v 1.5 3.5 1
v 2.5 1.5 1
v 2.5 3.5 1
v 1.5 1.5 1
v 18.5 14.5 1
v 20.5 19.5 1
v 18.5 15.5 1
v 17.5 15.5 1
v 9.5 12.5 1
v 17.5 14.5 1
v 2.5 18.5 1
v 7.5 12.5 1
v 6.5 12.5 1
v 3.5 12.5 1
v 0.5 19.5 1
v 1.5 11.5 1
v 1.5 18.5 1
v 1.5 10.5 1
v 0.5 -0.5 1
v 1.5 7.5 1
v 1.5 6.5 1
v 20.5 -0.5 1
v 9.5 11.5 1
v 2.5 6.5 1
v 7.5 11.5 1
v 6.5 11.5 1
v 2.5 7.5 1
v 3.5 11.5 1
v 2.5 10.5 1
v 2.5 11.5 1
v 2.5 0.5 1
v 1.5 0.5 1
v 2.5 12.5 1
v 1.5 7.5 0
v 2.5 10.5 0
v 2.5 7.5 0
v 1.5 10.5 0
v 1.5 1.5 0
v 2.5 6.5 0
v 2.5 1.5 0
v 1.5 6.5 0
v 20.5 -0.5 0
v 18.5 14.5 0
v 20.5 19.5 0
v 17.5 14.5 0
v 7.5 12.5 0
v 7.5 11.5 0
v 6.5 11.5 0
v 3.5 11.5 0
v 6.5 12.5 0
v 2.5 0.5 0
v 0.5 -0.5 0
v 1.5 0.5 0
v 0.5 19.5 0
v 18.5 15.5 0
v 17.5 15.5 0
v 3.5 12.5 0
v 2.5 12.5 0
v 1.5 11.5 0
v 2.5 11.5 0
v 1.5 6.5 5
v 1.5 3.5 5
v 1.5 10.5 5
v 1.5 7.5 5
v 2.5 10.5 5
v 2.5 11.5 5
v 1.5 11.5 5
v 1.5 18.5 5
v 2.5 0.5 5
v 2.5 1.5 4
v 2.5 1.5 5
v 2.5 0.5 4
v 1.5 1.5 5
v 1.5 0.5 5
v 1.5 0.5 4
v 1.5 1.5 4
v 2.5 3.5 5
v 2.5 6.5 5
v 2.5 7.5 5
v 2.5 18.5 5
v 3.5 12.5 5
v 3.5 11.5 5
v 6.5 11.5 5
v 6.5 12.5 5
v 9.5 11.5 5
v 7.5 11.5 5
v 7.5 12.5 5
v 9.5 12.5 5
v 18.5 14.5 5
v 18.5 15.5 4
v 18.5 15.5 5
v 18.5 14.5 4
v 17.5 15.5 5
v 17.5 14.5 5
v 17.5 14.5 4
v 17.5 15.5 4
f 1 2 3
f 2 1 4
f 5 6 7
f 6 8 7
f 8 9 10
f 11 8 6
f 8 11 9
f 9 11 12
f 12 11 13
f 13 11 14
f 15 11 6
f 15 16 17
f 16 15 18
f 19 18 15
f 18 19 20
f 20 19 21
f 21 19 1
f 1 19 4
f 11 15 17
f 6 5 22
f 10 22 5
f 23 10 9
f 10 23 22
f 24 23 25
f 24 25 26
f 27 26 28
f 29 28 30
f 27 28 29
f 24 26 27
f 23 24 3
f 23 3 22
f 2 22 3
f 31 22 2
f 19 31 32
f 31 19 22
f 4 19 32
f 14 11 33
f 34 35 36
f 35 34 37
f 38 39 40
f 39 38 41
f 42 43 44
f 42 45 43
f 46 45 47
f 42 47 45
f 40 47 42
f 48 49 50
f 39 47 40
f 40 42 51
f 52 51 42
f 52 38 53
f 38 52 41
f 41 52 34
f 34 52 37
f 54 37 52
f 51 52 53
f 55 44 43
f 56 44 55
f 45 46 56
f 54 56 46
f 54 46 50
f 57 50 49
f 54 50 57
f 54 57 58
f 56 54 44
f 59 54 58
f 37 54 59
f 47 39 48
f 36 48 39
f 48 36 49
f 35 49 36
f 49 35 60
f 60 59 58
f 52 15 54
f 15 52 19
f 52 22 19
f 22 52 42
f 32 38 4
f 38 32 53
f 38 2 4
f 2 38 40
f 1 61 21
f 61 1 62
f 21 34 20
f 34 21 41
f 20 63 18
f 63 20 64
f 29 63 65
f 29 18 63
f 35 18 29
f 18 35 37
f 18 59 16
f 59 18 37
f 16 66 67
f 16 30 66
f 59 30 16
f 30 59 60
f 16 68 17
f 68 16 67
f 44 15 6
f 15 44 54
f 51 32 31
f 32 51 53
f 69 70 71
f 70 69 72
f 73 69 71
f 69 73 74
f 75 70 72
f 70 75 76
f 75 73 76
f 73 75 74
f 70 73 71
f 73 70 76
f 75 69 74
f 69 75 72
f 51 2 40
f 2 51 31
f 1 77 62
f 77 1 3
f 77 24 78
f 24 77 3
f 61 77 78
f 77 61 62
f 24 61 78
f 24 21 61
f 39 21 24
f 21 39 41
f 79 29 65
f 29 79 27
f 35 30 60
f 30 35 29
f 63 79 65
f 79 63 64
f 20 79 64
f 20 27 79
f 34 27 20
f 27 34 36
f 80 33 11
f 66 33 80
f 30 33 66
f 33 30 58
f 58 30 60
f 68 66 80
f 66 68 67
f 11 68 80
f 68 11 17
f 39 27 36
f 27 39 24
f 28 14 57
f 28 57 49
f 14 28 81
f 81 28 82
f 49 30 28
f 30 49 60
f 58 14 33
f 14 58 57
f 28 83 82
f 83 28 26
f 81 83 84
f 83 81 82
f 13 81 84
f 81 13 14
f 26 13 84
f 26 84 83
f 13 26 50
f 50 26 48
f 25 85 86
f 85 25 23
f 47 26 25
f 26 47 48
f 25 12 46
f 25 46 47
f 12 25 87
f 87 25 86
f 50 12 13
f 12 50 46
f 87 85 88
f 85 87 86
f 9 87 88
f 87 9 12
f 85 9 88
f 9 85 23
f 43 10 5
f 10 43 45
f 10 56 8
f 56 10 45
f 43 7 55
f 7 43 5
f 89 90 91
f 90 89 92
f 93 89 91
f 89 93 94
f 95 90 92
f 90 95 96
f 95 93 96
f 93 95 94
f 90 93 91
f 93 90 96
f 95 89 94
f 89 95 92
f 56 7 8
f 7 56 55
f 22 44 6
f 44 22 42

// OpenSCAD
union() {
    translate([1, 0, 0.5]) cube([1, 1, 1], center=true);
    translate([1, 1, 0.5]) cube([1, 1, 1], center=true);
    translate([1, 2, 0.5]) cube([1, 1, 1], center=true);
    translate([1, 3, 0.5]) cube([1, 1, 1], center=true);
    translate([1, 4, 0.5]) cube([1, 1, 1], center=true);
    translate([1, 5, 0.5]) cube([1, 1, 1], center=true);
    translate([1, 6, 0.5]) cube([1, 1, 1], center=true);
    translate([1, 7, 0.5]) cube([1, 1, 1], center=true);
    translate([1, 8, 0.5]) cube([1, 1, 1], center=true);
    translate([1, 9, 0.5]) cube([1, 1, 1], center=true);
    translate([1, 10, 0.5]) cube([1, 1, 1], center=true);
    translate([1, 11, 0.5]) cube([1, 1, 1], center=true);
    translate([1, 12, 0.5]) cube([1, 1, 1], center=true);
    translate([1, 13, 0.5]) cube([1, 1, 1], center=true);
    translate([1, 14, 0.5]) cube([1, 1, 1], center=true);
    translate([1, 15, 0.5]) cube([1, 1, 1], center=true);
    translate([1, 16, 0.5]) cube([1, 1, 1], center=true);
    translate([1, 17, 0.5]) cube([1, 1, 1], center=true);
    translate([1, 18, 0.5]) cube([1, 1, 1], center=true);
    translate([1, 19, 0.5]) cube([1, 1, 1], center=true);
    translate([2, 0, 0.5]) cube([1, 1, 1], center=true);
    translate([2, 1, 4.5]) color([1, 0, 0]) cube([1, 1, 1], center=true);
    translate([2, 2, 0.5]) cube([1, 1, 1], center=true);
    translate([2, 3, 0.5]) cube([1, 1, 1], center=true);
    translate([2, 4, 2.5]) cube([1, 1, 5], center=true);
    translate([2, 5, 2.5]) cube([1, 1, 5], center=true);
    translate([2, 6, 2.5]) cube([1, 1, 5], center=true);
    translate([2, 8, 2.5]) cube([1, 1, 5], center=true);
    translate([2, 9, 2.5]) cube([1, 1, 5], center=true);
    translate([2, 10, 2.5]) cube([1, 1, 5], center=true);
    translate([2, 12, 2.5]) cube([1, 1, 5], center=true);
    translate([2, 13, 2.5]) cube([1, 1, 5], center=true);
    translate([2, 14, 2.5]) cube([1, 1, 5], center=true);
    translate([2, 15, 2.5]) cube([1, 1, 5], center=true);
    translate([2, 16, 2.5]) cube([1, 1, 5], center=true);
    translate([2, 17, 2.5]) cube([1, 1, 5], center=true);
    translate([2, 18, 2.5]) cube([1, 1, 5], center=true);
    translate([2, 19, 0.5]) cube([1, 1, 1], center=true);
    translate([3, 0, 0.5]) cube([1, 1, 1], center=true);
    translate([3, 1, 0.5]) cube([1, 1, 1], center=true);
    translate([3, 2, 0.5]) cube([1, 1, 1], center=true);
    translate([3, 3, 0.5]) cube([1, 1, 1], center=true);
    translate([3, 4, 0.5]) cube([1, 1, 1], center=true);
    translate([3, 5, 0.5]) cube([1, 1, 1], center=true);
    translate([3, 6, 0.5]) cube([1, 1, 1], center=true);
    translate([3, 7, 0.5]) cube([1, 1, 1], center=true);
    translate([3, 8, 0.5]) cube([1, 1, 1], center=true);
    translate([3, 9, 0.5]) cube([1, 1, 1], center=true);
    translate([3, 10, 0.5]) cube([1, 1, 1], center=true);
    translate([3, 11, 0.5]) cube([1, 1, 1], center=true);
    translate([3, 13, 0.5]) cube([1, 1, 1], center=true);
    translate([3, 14, 0.5]) cube([1, 1, 1], center=true);
    translate([3, 15, 0.5]) cube([1, 1, 1], center=true);
    translate([3, 16, 0.5]) cube([1, 1, 1], center=true);
    translate([3, 17, 0.5]) cube([1, 1, 1], center=true);
    translate([3, 18, 0.5]) cube([1, 1, 1], center=true);
    translate([3, 19, 0.5]) cube([1, 1, 1], center=true);
    translate([4, 0, 0.5]) cube([1, 1, 1], center=true);
    translate([4, 1, 0.5]) cube([1, 1, 1], center=true);
    translate([4, 2, 0.5]) cube([1, 1, 1], center=true);
    translate([4, 3, 0.5]) cube([1, 1, 1], center=true);
    translate([4, 4, 0.5]) cube([1, 1, 1], center=true);
    translate([4, 5, 0.5]) cube([1, 1, 1], center=true);
    translate([4, 6, 0.5]) cube([1, 1, 1], center=true);
    translate([4, 7, 0.5]) cube([1, 1, 1], center=true);
    translate([4, 8, 0.5]) cube([1, 1, 1], center=true);
    translate([4, 9, 0.5]) cube([1, 1, 1], center=true);
    translate([4, 10, 0.5]) cube([1, 1, 1], center=true);
    translate([4, 11, 0.5]) cube([1, 1, 1], center=true);
    translate([4, 12, 2.5]) cube([1, 1, 5], center=true);
    translate([4, 13, 0.5]) cube([1, 1, 1], center=true);
    translate([4, 14, 0.5]) cube([1, 1, 1], center=true);
    translate([4, 15, 0.5]) cube([1, 1, 1], center=true);
    translate([4, 16, 0.5]) cube([1, 1, 1], center=true);
    translate([4, 17, 0.5]) cube([1, 1, 1], center=true);
    translate([4, 18, 0.5]) cube([1, 1, 1], center=true);
    translate([4, 19, 0.5]) cube([1, 1, 1], center=true);
    translate([5, 0, 0.5]) cube([1, 1, 1], center=true);
    translate([5, 1, 0.5]) cube([1, 1, 1], center=true);
    translate([5, 2, 0.5]) cube([1, 1, 1], center=true);
    translate([5, 3, 0.5]) cube([1, 1, 1], center=true);
    translate([5, 4, 0.5]) cube([1, 1, 1], center=true);
    translate([5, 5, 0.5]) cube([1, 1, 1], center=true);
    translate([5, 6, 0.5]) cube([1, 1, 1], center=true);
    translate([5, 7, 0.5]) cube([1, 1, 1], center=true);
    translate([5, 8, 0.5]) cube([1, 1, 1], center=true);
    translate([5, 9, 0.5]) cube([1, 1, 1], center=true);
    translate([5, 10, 0.5]) cube([1, 1, 1], center=true);
    translate([5, 11, 0.5]) cube([1, 1, 1], center=true);
    translate([5, 12, 2.5]) cube([1, 1, 5], center=true);
    translate([5, 13, 0.5]) cube([1, 1, 1], center=true);
    translate([5, 14, 0.5]) cube([1, 1, 1], center=true);
    translate([5, 15, 0.5]) cube([1, 1, 1], center=true);
    translate([5, 16, 0.5]) cube([1, 1, 1], center=true);
    translate([5, 17, 0.5]) cube([1, 1, 1], center=true);
    translate([5, 18, 0.5]) cube([1, 1, 1], center=true);
    translate([5, 19, 0.5]) cube([1, 1, 1], center=true);
    translate([6, 0, 0.5]) cube([1, 1, 1], center=true);
    translate([6, 1, 0.5]) cube([1, 1, 1], center=true);
    translate([6, 2, 0.5]) cube([1, 1, 1], center=true);
    translate([6, 3, 0.5]) cube([1, 1, 1], center=true);
    translate([6, 4, 0.5]) cube([1, 1, 1], center=true);
    translate([6, 5, 0.5]) cube([1, 1, 1], center=true);
    translate([6, 6, 0.5]) cube([1, 1, 1], center=true);
    translate([6, 7, 0.5]) cube([1, 1, 1], center=true);
    translate([6, 8, 0.5]) cube([1, 1, 1], center=true);
    translate([6, 9, 0.5]) cube([1, 1, 1], center=true);
    translate([6, 10, 0.5]) cube([1, 1, 1], center=true);
    translate([6, 11, 0.5]) cube([1, 1, 1], center=true);
    translate([6, 12, 2.5]) cube([1, 1, 5], center=true);
    translate([6, 13, 0.5]) cube([1, 1, 1], center=true);
    translate([6, 14, 0.5]) cube([1, 1, 1], center=true);
    translate([6, 15, 0.5]) cube([1, 1, 1], center=true);
    translate([6, 16, 0.5]) cube([1, 1, 1], center=true);
    translate([6, 17, 0.5]) cube([1, 1, 1], center=true);
    translate([6, 18, 0.5]) cube([1, 1, 1], center=true);
    translate([6, 19, 0.5]) cube([1, 1, 1], center=true);
    translate([7, 0, 0.5]) cube([1, 1, 1], center=true);
    translate([7, 1, 0.5]) cube([1, 1, 1], center=true);
    translate([7, 2, 0.5]) cube([1, 1, 1], center=true);
    translate([7, 3, 0.5]) cube([1, 1, 1], center=true);
    translate([7, 4, 0.5]) cube([1, 1, 1], center=true);
    translate([7, 5, 0.5]) cube([1, 1, 1], center=true);
    translate([7, 6, 0.5]) cube([1, 1, 1], center=true);
    translate([7, 7, 0.5]) cube([1, 1, 1], center=true);
    translate([7, 8, 0.5]) cube([1, 1, 1], center=true);
    translate([7, 9, 0.5]) cube([1, 1, 1], center=true);
    translate([7, 10, 0.5]) cube([1, 1, 1], center=true);
    translate([7, 11, 0.5]) cube([1, 1, 1], center=true);
    translate([7, 13, 0.5]) cube([1, 1, 1], center=true);
    translate([7, 14, 0.5]) cube([1, 1, 1], center=true);
    translate([7, 15, 0.5]) cube([1, 1, 1], center=true);
    translate([7, 16, 0.5]) cube([1, 1, 1], center=true);
    translate([7, 17, 0.5]) cube([1, 1, 1], center=true);
    translate([7, 18, 0.5]) cube([1, 1, 1], center=true);
    translate([7, 19, 0.5]) cube([1, 1, 1], center=true);
    translate([8, 0, 0.5]) cube([1, 1, 1], center=true);
    translate([8, 1, 0.5]) cube([1, 1, 1], center=true);
    translate([8, 2, 0.5]) cube([1, 1, 1], center=true);
    translate([8, 3, 0.5]) cube([1, 1, 1], center=true);
    translate([8, 4, 0.5]) cube([1, 1, 1], center=true);
    translate([8, 5, 0.5]) cube([1, 1, 1], center=true);
    translate([8, 6, 0.5]) cube([1, 1, 1], center=true);
    translate([8, 7, 0.5]) cube([1, 1, 1], center=true);
    translate([8, 8, 0.5]) cube([1, 1, 1], center=true);
    translate([8, 9, 0.5]) cube([1, 1, 1], center=true);
    translate([8, 10, 0.5]) cube([1, 1, 1], center=true);
    translate([8, 11, 0.5]) cube([1, 1, 1], center=true);
    translate([8, 12, 2.5]) cube([1, 1, 5], center=true);
    translate([8, 13, 0.5]) cube([1, 1, 1], center=true);
    translate([8, 14, 0.5]) cube([1, 1, 1], center=true);
    translate([8, 15, 0.5]) cube([1, 1, 1], center=true);
    translate([8, 16, 0.5]) cube([1, 1, 1], center=true);
    translate([8, 17, 0.5]) cube([1, 1, 1], center=true);
    translate([8, 18, 0.5]) cube([1, 1, 1], center=true);
    translate([8, 19, 0.5]) cube([1, 1, 1], center=true);
    translate([9, 0, 0.5]) cube([1, 1, 1], center=true);
    translate([9, 1, 0.5]) cube([1, 1, 1], center=true);
    translate([9, 2, 0.5]) cube([1, 1, 1], center=true);
    translate([9, 3, 0.5]) cube([1, 1, 1], center=true);
    translate([9, 4, 0.5]) cube([1, 1, 1], center=true);
    translate([9, 5, 0.5]) cube([1, 1, 1], center=true);
    translate([9, 6, 0.5]) cube([1, 1, 1], center=true);
    translate([9, 7, 0.5]) cube([1, 1, 1], center=true);
    translate([9, 8, 0.5]) cube([1, 1, 1], center=true);
    translate([9, 9, 0.5]) cube([1, 1, 1], center=true);
    translate([9, 10, 0.5]) cube([1, 1, 1], center=true);
    translate([9, 11, 0.5]) cube([1, 1, 1], center=true);
    translate([9, 12, 2.5]) cube([1, 1, 5], center=true);
    translate([9, 13, 0.5]) cube([1, 1, 1], center=true);
    translate([9, 14, 0.5]) cube([1, 1, 1], center=true);
    translate([9, 15, 0.5]) cube([1, 1, 1], center=true);
    translate([9, 16, 0.5]) cube([1, 1, 1], center=true);
    translate([9, 17, 0.5]) cube([1, 1, 1], center=true);
    translate([9, 18, 0.5]) cube([1, 1, 1], center=true);
    translate([9, 19, 0.5]) cube([1, 1, 1], center=true);
    translate([10, 0, 0.5]) cube([1, 1, 1], center=true);
    translate([10, 1, 0.5]) cube([1, 1, 1], center=true);
    translate([10, 2, 0.5]) cube([1, 1, 1], center=true);
    translate([10, 3, 0.5]) cube([1, 1, 1], center=true);
    translate([10, 4, 0.5]) cube([1, 1, 1], center=true);
    translate([10, 5, 0.5]) cube([1, 1, 1], center=true);
    translate([10, 6, 0.5]) cube([1, 1, 1], center=true);
    translate([10, 7, 0.5]) cube([1, 1, 1], center=true);
    translate([10, 8, 0.5]) cube([1, 1, 1], center=true);
    translate([10, 9, 0.5]) cube([1, 1, 1], center=true);
    translate([10, 10, 0.5]) cube([1, 1, 1], center=true);
    translate([10, 11, 0.5]) cube([1, 1, 1], center=true);
    translate([10, 12, 0.5]) cube([1, 1, 1], center=true);
    translate([10, 13, 0.5]) cube([1, 1, 1], center=true);
    translate([10, 14, 0.5]) cube([1, 1, 1], center=true);
    translate([10, 15, 0.5]) cube([1, 1, 1], center=true);
    translate([10, 16, 0.5]) cube([1, 1, 1], center=true);
    translate([10, 17, 0.5]) cube([1, 1, 1], center=true);
    translate([10, 18, 0.5]) cube([1, 1, 1], center=true);
    translate([10, 19, 0.5]) cube([1, 1, 1], center=true);
    translate([11, 0, 0.5]) cube([1, 1, 1], center=true);
    translate([11, 1, 0.5]) cube([1, 1, 1], center=true);
    translate([11, 2, 0.5]) cube([1, 1, 1], center=true);
    translate([11, 3, 0.5]) cube([1, 1, 1], center=true);
    translate([11, 4, 0.5]) cube([1, 1, 1], center=true);
    translate([11, 5, 0.5]) cube([1, 1, 1], center=true);
    translate([11, 6, 0.5]) cube([1, 1, 1], center=true);
    translate([11, 7, 0.5]) cube([1, 1, 1], center=true);
    translate([11, 8, 0.5]) cube([1, 1, 1], center=true);
    translate([11, 9, 0.5]) cube([1, 1, 1], center=true);
    translate([11, 10, 0.5]) cube([1, 1, 1], center=true);
    translate([11, 11, 0.5]) cube([1, 1, 1], center=true);
    translate([11, 12, 0.5]) cube([1, 1, 1], center=true);
    translate([11, 13, 0.5]) cube([1, 1, 1], center=true);
    translate([11, 14, 0.5]) cube([1, 1, 1], center=true);
    translate([11, 15, 0.5]) cube([1, 1, 1], center=true);
    translate([11, 16, 0.5]) cube([1, 1, 1], center=true);
    translate([11, 17, 0.5]) cube([1, 1, 1], center=true);
    translate([11, 18, 0.5]) cube([1, 1, 1], center=true);
    translate([11, 19, 0.5]) cube([1, 1, 1], center=true);
    translate([12, 0, 0.5]) cube([1, 1, 1], center=true);
    translate([12, 1, 0.5]) cube([1, 1, 1], center=true);
    translate([12, 2, 0.5]) cube([1, 1, 1], center=true);
    translate([12, 3, 0.5]) cube([1, 1, 1], center=true);
    translate([12, 4, 0.5]) cube([1, 1, 1], center=true);
    translate([12, 5, 0.5]) cube([1, 1, 1], center=true);
    translate([12, 6, 0.5]) cube([1, 1, 1], center=true);
    translate([12, 7, 0.5]) cube([1, 1, 1], center=true);
    translate([12, 8, 0.5]) cube([1, 1, 1], center=true);
    translate([12, 9, 0.5]) cube([1, 1, 1], center=true);
    translate([12, 10, 0.5]) cube([1, 1, 1], center=true);
    translate([12, 11, 0.5]) cube([1, 1, 1], center=true);
    translate([12, 12, 0.5]) cube([1, 1, 1], center=true);
    translate([12, 13, 0.5]) cube([1, 1, 1], center=true);
    translate([12, 14, 0.5]) cube([1, 1, 1], center=true);
    translate([12, 15, 0.5]) cube([1, 1, 1], center=true);
    translate([12, 16, 0.5]) cube([1, 1, 1], center=true);
    translate([12, 17, 0.5]) cube([1, 1, 1], center=true);
    translate([12, 18, 0.5]) cube([1, 1, 1], center=true);
    translate([12, 19, 0.5]) cube([1, 1, 1], center=true);
    translate([13, 0, 0.5]) cube([1, 1, 1], center=true);
    translate([13, 1, 0.5]) cube([1, 1, 1], center=true);
    translate([13, 2, 0.5]) cube([1, 1, 1], center=true);
    translate([13, 3, 0.5]) cube([1, 1, 1], center=true);
    translate([13, 4, 0.5]) cube([1, 1, 1], center=true);
    translate([13, 5, 0.5]) cube([1, 1, 1], center=true);
    translate([13, 6, 0.5]) cube([1, 1, 1], center=true);
    translate([13, 7, 0.5]) cube([1, 1, 1], center=true);
    translate([13, 8, 0.5]) cube([1, 1, 1], center=true);
    translate([13, 9, 0.5]) cube([1, 1, 1], center=true);
    translate([13, 10, 0.5]) cube([1, 1, 1], center=true);
    translate([13, 11, 0.5]) cube([1, 1, 1], center=true);
    translate([13, 12, 0.5]) cube([1, 1, 1], center=true);
    translate([13, 13, 0.5]) cube([1, 1, 1], center=true);
    translate([13, 14, 0.5]) cube([1, 1, 1], center=true);
    translate([13, 15, 0.5]) cube([1, 1, 1], center=true);
    translate([13, 16, 0.5]) cube([1, 1, 1], center=true);
    translate([13, 17, 0.5]) cube([1, 1, 1], center=true);
    translate([13, 18, 0.5]) cube([1, 1, 1], center=true);
    translate([13, 19, 0.5]) cube([1, 1, 1], center=true);
    translate([14, 0, 0.5]) cube([1, 1, 1], center=true);
    translate([14, 1, 0.5]) cube([1, 1, 1], center=true);
    translate([14, 2, 0.5]) cube([1, 1, 1], center=true);
    translate([14, 3, 0.5]) cube([1, 1, 1], center=true);
    translate([14, 4, 0.5]) cube([1, 1, 1], center=true);
    translate([14, 5, 0.5]) cube([1, 1, 1], center=true);
    translate([14, 6, 0.5]) cube([1, 1, 1], center=true);
    translate([14, 7, 0.5]) cube([1, 1, 1], center=true);
    translate([14, 8, 0.5]) cube([1, 1, 1], center=true);
    translate([14, 9, 0.5]) cube([1, 1, 1], center=true);
    translate([14, 10, 0.5]) cube([1, 1, 1], center=true);
    translate([14, 11, 0.5]) cube([1, 1, 1], center=true);
    translate([14, 12, 0.5]) cube([1, 1, 1], center=true);
    translate([14, 13, 0.5]) cube([1, 1, 1], center=true);
    translate([14, 14, 0.5]) cube([1, 1, 1], center=true);
    translate([14, 15, 0.5]) cube([1, 1, 1], center=true);
    translate([14, 16, 0.5]) cube([1, 1, 1], center=true);
    translate([14, 17, 0.5]) cube([1, 1, 1], center=true);
    translate([14, 18, 0.5]) cube([1, 1, 1], center=true);
    translate([14, 19, 0.5]) cube([1, 1, 1], center=true);
    translate([15, 0, 0.5]) cube([1, 1, 1], center=true);
    translate([15, 1, 0.5]) cube([1, 1, 1], center=true);
    translate([15, 2, 0.5]) cube([1, 1, 1], center=true);
    translate([15, 3, 0.5]) cube([1, 1, 1], center=true);
    translate([15, 4, 0.5]) cube([1, 1, 1], center=true);
    translate([15, 5, 0.5]) cube([1, 1, 1], center=true);
    translate([15, 6, 0.5]) cube([1, 1, 1], center=true);
    translate([15, 7, 0.5]) cube([1, 1, 1], center=true);
    translate([15, 8, 0.5]) cube([1, 1, 1], center=true);
    translate([15, 9, 0.5]) cube([1, 1, 1], center=true);
    translate([15, 10, 0.5]) cube([1, 1, 1], center=true);
    translate([15, 11, 0.5]) cube([1, 1, 1], center=true);
    translate([15, 12, 0.5]) cube([1, 1, 1], center=true);
    translate([15, 13, 0.5]) cube([1, 1, 1], center=true);
    translate([15, 14, 0.5]) cube([1, 1, 1], center=true);
    translate([15, 15, 0.5]) cube([1, 1, 1], center=true);
    translate([15, 16, 0.5]) cube([1, 1, 1], center=true);
    translate([15, 17, 0.5]) cube([1, 1, 1], center=true);
    translate([15, 18, 0.5]) cube([1, 1, 1], center=true);
    translate([15, 19, 0.5]) cube([1, 1, 1], center=true);
    translate([16, 0, 0.5]) cube([1, 1, 1], center=true);
    translate([16, 1, 0.5]) cube([1, 1, 1], center=true);
    translate([16, 2, 0.5]) cube([1, 1, 1], center=true);
    translate([16, 3, 0.5]) cube([1, 1, 1], center=true);
    translate([16, 4, 0.5]) cube([1, 1, 1], center=true);
    translate([16, 5, 0.5]) cube([1, 1, 1], center=true);
    translate([16, 6, 0.5]) cube([1, 1, 1], center=true);
    translate([16, 7, 0.5]) cube([1, 1, 1], center=true);
    translate([16, 8, 0.5]) cube([1, 1, 1], center=true);
    translate([16, 9, 0.5]) cube([1, 1, 1], center=true);
    translate([16, 10, 0.5]) cube([1, 1, 1], center=true);
    translate([16, 11, 0.5]) cube([1, 1, 1], center=true);
    translate([16, 12, 0.5]) cube([1, 1, 1], center=true);
    translate([16, 13, 0.5]) cube([1, 1, 1], center=true);
    translate([16, 14, 0.5]) cube([1, 1, 1], center=true);
    translate([16, 15, 0.5]) cube([1, 1, 1], center=true);
    translate([16, 16, 0.5]) cube([1, 1, 1], center=true);
    translate([16, 17, 0.5]) cube([1, 1, 1], center=true);
    translate([16, 18, 0.5]) cube([1, 1, 1], center=true);
    translate([16, 19, 0.5]) cube([1, 1, 1], center=true);
    translate([17, 0, 0.5]) cube([1, 1, 1], center=true);
    translate([17, 1, 0.5]) cube([1, 1, 1], center=true);
    translate([17, 2, 0.5]) cube([1, 1, 1], center=true);
    translate([17, 3, 0.5]) cube([1, 1, 1], center=true);
    translate([17, 4, 0.5]) cube([1, 1, 1], center=true);
    translate([17, 5, 0.5]) cube([1, 1, 1], center=true);
    translate([17, 6, 0.5]) cube([1, 1, 1], center=true);
    translate([17, 7, 0.5]) cube([1, 1, 1], center=true);
    translate([17, 8, 0.5]) cube([1, 1, 1], center=true);
    translate([17, 9, 0.5]) cube([1, 1, 1], center=true);
    translate([17, 10, 0.5]) cube([1, 1, 1], center=true);
    translate([17, 11, 0.5]) cube([1, 1, 1], center=true);
    translate([17, 12, 0.5]) cube([1, 1, 1], center=true);
    translate([17, 13, 0.5]) cube([1, 1, 1], center=true);
    translate([17, 14, 0.5]) cube([1, 1, 1], center=true);
    translate([17, 15, 0.5]) cube([1, 1, 1], center=true);
    translate([17, 16, 0.5]) cube([1, 1, 1], center=true);
    translate([17, 17, 0.5]) cube([1, 1, 1], center=true);
    translate([17, 18, 0.5]) cube([1, 1, 1], center=true);
    translate([17, 19, 0.5]) cube([1, 1, 1], center=true);
    translate([18, 0, 0.5]) cube([1, 1, 1], center=true);
    translate([18, 1, 0.5]) cube([1, 1, 1], center=true);
    translate([18, 2, 0.5]) cube([1, 1, 1], center=true);
    translate([18, 3, 0.5]) cube([1, 1, 1], center=true);
    translate([18, 4, 0.5]) cube([1, 1, 1], center=true);
    translate([18, 5, 0.5]) cube([1, 1, 1], center=true);
    translate([18, 6, 0.5]) cube([1, 1, 1], center=true);
    translate([18, 7, 0.5]) cube([1, 1, 1], center=true);
    translate([18, 8, 0.5]) cube([1, 1, 1], center=true);
    translate([18, 9, 0.5]) cube([1, 1, 1], center=true);
    translate([18, 10, 0.5]) cube([1, 1, 1], center=true);
    translate([18, 11, 0.5]) cube([1, 1, 1], center=true);
    translate([18, 12, 0.5]) cube([1, 1, 1], center=true);
    translate([18, 13, 0.5]) cube([1, 1, 1], center=true);
    translate([18, 14, 0.5]) cube([1, 1, 1], center=true);
    translate([18, 15, 4.5]) color([0, 0, 1]) cube([1, 1, 1], center=true);
    translate([18, 16, 0.5]) cube([1, 1, 1], center=true);
    translate([18, 17, 0.5]) cube([1, 1, 1], center=true);
    translate([18, 18, 0.5]) cube([1, 1, 1], center=true);
    translate([18, 19, 0.5]) cube([1, 1, 1], center=true);
    translate([19, 0, 0.5]) cube([1, 1, 1], center=true);
    translate([19, 1, 0.5]) cube([1, 1, 1], center=true);
    translate([19, 2, 0.5]) cube([1, 1, 1], center=true);
    translate([19, 3, 0.5]) cube([1, 1, 1], center=true);
    translate([19, 4, 0.5]) cube([1, 1, 1], center=true);
    translate([19, 5, 0.5]) cube([1, 1, 1], center=true);
    translate([19, 6, 0.5]) cube([1, 1, 1], center=true);
    translate([19, 7, 0.5]) cube([1, 1, 1], center=true);
    translate([19, 8, 0.5]) cube([1, 1, 1], center=true);
    translate([19, 9, 0.5]) cube([1, 1, 1], center=true);
    translate([19, 10, 0.5]) cube([1, 1, 1], center=true);
    translate([19, 11, 0.5]) cube([1, 1, 1], center=true);
    translate([19, 12, 0.5]) cube([1, 1, 1], center=true);
    translate([19, 13, 0.5]) cube([1, 1, 1], center=true);
    translate([19, 14, 0.5]) cube([1, 1, 1], center=true);
    translate([19, 15, 0.5]) cube([1, 1, 1], center=true);
    translate([19, 16, 0.5]) cube([1, 1, 1], center=true);
    translate([19, 17, 0.5]) cube([1, 1, 1], center=true);
    translate([19, 18, 0.5]) cube([1, 1, 1], center=true);
    translate([19, 19, 0.5]) cube([1, 1, 1], center=true);
    translate([20, 0, 0.5]) cube([1, 1, 1], center=true);
    translate([20, 1, 0.5]) cube([1, 1, 1], center=true);
    translate([20, 2, 0.5]) cube([1, 1, 1], center=true);
    translate([20, 3, 0.5]) cube([1, 1, 1], center=true);
    translate([20, 4, 0.5]) cube([1, 1, 1], center=true);
    translate([20, 5, 0.5]) cube([1, 1, 1], center=true);
    translate([20, 6, 0.5]) cube([1, 1, 1], center=true);
    translate([20, 7, 0.5]) cube([1, 1, 1], center=true);
    translate([20, 8, 0.5]) cube([1, 1, 1], center=true);
    translate([20, 9, 0.5]) cube([1, 1, 1], center=true);
    translate([20, 10, 0.5]) cube([1, 1, 1], center=true);
    translate([20, 11, 0.5]) cube([1, 1, 1], center=true);
    translate([20, 12, 0.5]) cube([1, 1, 1], center=true);
    translate([20, 13, 0.5]) cube([1, 1, 1], center=true);
    translate([20, 14, 0.5]) cube([1, 1, 1], center=true);
    translate([20, 15, 0.5]) cube([1, 1, 1], center=true);
    translate([20, 16, 0.5]) cube([1, 1, 1], center=true);
    translate([20, 17, 0.5]) cube([1, 1, 1], center=true);
    translate([20, 18, 0.5]) cube([1, 1, 1], center=true);
    translate([20, 19, 0.5]) cube([1, 1, 1], center=true);
}
